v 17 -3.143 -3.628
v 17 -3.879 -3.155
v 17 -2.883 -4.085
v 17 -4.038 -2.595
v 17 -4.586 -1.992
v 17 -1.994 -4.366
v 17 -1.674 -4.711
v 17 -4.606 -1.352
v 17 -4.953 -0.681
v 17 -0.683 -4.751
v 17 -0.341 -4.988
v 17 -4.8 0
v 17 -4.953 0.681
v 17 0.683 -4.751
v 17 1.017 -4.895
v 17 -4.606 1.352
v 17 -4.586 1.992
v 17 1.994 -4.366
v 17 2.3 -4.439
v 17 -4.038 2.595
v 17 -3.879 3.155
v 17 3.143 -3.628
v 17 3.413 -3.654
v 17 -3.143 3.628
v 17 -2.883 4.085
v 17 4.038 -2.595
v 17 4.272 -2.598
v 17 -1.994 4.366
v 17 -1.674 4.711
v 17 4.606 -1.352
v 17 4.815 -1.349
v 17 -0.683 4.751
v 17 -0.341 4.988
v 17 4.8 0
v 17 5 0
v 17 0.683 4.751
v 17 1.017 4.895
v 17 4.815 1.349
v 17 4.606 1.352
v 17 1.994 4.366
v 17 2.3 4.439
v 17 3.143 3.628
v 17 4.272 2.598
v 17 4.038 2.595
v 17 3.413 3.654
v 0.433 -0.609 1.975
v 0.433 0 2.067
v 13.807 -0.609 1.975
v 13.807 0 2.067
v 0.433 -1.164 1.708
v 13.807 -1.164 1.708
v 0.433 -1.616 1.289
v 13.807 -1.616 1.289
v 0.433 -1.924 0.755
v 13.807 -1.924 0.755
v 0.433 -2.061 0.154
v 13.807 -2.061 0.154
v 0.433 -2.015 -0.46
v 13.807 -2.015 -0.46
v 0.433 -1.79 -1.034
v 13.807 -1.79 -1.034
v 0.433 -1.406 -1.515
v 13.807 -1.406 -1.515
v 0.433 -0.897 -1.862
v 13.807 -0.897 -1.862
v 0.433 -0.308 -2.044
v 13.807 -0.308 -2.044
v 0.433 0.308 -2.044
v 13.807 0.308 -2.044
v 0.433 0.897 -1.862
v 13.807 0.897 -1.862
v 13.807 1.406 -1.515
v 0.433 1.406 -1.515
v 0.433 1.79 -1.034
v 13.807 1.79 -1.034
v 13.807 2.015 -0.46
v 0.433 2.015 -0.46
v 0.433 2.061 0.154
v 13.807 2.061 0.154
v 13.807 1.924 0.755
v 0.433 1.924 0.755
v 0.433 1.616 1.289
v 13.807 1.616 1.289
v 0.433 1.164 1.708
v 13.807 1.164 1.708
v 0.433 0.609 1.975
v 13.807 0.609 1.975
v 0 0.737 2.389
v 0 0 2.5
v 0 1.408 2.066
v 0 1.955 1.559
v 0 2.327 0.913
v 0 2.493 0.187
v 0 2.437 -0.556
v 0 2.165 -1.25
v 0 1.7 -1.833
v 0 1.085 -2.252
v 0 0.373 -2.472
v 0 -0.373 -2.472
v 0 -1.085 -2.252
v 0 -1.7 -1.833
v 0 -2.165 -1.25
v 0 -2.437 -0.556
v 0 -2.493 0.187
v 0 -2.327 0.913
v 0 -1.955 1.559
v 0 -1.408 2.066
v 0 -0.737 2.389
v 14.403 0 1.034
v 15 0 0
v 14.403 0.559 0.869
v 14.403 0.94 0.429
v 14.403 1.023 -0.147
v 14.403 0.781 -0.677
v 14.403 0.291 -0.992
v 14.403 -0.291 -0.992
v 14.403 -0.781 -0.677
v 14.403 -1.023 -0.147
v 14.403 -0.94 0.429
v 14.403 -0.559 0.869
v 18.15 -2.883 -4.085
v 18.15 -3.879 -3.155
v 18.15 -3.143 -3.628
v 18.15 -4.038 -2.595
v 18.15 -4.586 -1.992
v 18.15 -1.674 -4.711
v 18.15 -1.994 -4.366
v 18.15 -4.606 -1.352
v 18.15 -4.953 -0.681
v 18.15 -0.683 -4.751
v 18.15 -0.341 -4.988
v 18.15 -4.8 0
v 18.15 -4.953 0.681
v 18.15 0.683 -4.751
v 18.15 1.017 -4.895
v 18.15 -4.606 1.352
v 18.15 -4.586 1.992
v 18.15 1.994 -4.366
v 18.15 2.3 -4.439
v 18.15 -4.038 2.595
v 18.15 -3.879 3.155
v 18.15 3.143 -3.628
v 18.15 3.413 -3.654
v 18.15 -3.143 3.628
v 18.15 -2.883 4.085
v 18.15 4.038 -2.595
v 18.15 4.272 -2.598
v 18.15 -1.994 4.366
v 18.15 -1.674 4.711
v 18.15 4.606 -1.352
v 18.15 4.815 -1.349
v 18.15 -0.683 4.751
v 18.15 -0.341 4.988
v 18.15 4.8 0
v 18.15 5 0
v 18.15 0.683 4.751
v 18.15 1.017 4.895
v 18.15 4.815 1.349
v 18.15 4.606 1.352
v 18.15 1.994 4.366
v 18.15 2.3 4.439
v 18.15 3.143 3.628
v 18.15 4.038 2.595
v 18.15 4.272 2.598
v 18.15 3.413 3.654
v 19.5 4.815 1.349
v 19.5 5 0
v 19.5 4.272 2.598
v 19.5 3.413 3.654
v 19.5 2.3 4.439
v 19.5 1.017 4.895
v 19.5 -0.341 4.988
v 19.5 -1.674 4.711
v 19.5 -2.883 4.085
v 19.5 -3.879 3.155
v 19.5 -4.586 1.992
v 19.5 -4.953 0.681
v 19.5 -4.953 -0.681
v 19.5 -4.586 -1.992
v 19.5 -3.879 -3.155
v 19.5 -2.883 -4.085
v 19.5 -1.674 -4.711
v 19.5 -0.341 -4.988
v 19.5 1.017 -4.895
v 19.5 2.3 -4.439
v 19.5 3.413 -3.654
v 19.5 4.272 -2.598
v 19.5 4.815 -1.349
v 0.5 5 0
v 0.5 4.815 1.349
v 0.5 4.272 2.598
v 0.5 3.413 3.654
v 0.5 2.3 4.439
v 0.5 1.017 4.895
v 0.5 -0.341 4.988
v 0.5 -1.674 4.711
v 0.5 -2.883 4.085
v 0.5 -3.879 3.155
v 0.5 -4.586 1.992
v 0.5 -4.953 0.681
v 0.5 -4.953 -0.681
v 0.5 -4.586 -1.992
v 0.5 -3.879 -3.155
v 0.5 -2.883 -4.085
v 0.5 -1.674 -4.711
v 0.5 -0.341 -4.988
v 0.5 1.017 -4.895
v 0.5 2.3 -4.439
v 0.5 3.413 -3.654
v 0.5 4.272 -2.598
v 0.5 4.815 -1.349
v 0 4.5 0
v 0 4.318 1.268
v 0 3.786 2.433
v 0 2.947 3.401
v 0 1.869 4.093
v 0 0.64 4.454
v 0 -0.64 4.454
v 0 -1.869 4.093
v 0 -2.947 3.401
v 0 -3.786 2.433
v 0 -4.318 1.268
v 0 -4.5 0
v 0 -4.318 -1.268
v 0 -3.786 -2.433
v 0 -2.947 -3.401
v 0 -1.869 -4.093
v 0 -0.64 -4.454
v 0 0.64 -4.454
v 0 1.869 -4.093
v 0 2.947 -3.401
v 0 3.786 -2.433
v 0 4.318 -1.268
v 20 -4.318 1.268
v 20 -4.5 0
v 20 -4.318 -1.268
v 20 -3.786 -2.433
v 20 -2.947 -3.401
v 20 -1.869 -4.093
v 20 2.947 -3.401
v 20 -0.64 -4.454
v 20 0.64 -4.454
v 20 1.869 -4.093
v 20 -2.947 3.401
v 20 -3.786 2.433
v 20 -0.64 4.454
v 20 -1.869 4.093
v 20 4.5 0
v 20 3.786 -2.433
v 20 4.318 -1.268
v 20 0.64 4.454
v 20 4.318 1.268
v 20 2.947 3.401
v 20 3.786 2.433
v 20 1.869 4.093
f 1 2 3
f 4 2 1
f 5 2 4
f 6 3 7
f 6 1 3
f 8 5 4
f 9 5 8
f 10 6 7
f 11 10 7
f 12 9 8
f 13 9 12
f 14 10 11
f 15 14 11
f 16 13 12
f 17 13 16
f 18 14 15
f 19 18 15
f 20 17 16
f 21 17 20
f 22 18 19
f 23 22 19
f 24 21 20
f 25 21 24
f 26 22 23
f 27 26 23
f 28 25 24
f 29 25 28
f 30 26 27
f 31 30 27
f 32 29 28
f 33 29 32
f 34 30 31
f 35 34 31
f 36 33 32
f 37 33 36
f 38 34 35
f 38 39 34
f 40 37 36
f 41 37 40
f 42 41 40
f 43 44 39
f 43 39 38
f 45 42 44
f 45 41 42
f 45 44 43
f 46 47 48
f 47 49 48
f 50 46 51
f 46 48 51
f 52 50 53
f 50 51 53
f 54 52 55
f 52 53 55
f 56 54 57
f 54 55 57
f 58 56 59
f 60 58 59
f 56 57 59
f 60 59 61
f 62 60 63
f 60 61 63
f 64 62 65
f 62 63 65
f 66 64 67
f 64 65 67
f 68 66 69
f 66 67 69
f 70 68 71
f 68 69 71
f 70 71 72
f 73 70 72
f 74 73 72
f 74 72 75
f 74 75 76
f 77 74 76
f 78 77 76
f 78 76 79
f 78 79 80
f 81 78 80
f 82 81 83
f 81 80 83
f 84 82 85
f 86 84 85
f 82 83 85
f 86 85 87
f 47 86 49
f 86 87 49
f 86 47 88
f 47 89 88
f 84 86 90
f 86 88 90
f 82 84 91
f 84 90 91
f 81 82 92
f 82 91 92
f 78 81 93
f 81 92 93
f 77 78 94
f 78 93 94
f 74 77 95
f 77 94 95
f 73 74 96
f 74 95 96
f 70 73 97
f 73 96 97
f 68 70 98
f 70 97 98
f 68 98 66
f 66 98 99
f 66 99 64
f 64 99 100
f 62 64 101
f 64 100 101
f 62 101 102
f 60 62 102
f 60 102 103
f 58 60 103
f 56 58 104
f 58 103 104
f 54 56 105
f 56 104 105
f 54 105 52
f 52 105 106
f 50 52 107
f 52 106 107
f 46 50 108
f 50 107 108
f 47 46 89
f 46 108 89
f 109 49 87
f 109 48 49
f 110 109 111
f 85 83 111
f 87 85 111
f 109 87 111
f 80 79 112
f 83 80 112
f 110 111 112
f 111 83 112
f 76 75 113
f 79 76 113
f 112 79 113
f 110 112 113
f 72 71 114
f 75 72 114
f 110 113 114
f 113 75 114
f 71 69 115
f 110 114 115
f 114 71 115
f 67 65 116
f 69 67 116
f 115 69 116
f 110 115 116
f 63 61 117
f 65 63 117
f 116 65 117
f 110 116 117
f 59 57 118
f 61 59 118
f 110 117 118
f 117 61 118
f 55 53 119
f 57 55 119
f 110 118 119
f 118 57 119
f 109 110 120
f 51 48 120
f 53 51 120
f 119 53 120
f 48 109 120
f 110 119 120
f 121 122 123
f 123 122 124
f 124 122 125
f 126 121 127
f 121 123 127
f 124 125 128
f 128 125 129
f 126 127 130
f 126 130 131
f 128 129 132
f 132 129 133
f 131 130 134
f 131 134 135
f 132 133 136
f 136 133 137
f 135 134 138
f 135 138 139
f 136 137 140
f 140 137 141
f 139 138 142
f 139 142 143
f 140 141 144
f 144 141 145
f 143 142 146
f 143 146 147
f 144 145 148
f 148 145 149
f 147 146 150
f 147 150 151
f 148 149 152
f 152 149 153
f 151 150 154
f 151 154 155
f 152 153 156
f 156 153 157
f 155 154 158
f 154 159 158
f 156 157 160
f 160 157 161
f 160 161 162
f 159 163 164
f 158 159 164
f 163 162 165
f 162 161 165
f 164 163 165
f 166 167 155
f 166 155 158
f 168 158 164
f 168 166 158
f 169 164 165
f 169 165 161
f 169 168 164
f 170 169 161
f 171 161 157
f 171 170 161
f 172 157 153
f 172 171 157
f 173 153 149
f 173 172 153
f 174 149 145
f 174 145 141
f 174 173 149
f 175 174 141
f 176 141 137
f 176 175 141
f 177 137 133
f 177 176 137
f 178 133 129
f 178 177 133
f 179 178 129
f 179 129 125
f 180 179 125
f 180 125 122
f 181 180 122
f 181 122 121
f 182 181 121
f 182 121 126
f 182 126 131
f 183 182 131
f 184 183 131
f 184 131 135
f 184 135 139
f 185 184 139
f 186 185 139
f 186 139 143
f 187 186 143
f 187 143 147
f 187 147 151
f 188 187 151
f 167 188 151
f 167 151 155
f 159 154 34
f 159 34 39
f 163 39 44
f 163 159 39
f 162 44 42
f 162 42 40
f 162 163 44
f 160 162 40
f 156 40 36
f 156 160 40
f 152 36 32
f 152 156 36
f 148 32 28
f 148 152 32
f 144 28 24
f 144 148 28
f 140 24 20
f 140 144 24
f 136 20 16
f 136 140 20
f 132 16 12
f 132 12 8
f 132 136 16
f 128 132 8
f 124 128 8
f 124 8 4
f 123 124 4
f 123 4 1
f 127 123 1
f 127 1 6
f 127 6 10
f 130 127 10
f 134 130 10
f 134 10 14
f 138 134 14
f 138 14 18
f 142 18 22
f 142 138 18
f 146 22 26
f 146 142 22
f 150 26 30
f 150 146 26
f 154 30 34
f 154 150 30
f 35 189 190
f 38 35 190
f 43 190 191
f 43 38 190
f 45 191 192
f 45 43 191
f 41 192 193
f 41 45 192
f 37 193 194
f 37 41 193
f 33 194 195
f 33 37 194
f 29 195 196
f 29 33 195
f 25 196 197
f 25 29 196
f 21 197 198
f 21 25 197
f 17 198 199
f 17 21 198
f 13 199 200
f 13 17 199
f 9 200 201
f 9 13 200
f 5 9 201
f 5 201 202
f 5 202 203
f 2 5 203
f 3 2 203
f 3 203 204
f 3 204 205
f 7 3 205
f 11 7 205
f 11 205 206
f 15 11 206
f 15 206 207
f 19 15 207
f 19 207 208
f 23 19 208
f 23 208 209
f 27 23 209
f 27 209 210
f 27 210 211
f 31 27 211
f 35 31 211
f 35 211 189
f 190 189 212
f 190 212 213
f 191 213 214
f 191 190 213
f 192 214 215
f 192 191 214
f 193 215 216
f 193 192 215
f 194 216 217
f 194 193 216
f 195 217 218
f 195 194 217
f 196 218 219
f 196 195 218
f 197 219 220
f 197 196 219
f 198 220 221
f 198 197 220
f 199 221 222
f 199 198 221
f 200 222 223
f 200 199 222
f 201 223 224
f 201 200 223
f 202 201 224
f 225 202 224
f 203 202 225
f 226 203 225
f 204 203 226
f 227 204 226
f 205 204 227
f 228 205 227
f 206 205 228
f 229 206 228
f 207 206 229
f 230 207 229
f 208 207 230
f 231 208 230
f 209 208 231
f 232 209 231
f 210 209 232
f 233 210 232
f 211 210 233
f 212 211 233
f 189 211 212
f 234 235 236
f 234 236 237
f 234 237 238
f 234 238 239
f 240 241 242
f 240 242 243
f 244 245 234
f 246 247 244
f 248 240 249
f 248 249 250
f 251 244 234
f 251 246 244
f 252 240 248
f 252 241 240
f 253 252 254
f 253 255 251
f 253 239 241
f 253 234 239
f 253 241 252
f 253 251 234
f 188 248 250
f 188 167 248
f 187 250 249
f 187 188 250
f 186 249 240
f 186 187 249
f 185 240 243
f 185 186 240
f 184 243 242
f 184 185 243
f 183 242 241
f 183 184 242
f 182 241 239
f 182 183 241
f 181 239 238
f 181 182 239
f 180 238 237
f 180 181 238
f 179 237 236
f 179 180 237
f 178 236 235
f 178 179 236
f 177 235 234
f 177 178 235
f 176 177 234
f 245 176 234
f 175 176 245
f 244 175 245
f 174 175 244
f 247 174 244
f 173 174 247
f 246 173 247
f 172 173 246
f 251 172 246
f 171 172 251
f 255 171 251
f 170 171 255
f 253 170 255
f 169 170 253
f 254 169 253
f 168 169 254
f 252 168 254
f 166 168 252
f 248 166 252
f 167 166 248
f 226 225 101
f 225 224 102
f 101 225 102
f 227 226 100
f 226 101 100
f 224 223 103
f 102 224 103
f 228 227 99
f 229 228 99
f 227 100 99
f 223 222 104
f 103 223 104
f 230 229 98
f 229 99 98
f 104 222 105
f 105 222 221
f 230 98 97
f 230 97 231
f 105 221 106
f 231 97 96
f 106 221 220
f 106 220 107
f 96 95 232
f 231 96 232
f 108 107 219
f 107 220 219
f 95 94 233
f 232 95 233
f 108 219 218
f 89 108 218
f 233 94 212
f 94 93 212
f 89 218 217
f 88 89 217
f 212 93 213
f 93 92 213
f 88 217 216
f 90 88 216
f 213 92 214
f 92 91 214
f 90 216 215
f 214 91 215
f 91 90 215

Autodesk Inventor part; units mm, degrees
sketch "Sketch_1" plane through (0, 0, 0) normal (0, 0, 1) x (1, 0, 0)
  line L0 (20, 0) -> (0, 0)
  line L1 (0, 0) -> (0, 4.5)
  line L2 (0, 4.5) -> (0.5, 5)
  line L3 (0.5, 5) -> (19.5, 5)
  line L4 (19.5, 5) -> (20, 4.5)
  line L5 (20, 4.5) -> (20, 0)
  line L6 (20, 0) -> (0, 0)
revolve "Revolution1" add sketch "Sketch_1" angle 360 about axis through (20, 0, 0) along (1, 0, 0)
sketch "Sketch2" plane through (0, 0, 0) normal (-1, 0, 0) x (0, 0, 1)
  point P0 (0, 0)
hole "Hole1" at (0, 0, 0) direction (1, 0, 0) diameter 4.134 depth 13.8066 tip angle 120 countersink diameter 5 countersink angle 90 thread size "M5x0.8" class "6H" standard "ISO Metric profile"
sketch "Sketch_20" plane through (0, 0, 0) normal (0, 0, 1) x (1, 0, 0)
  line L0 (20, 0) -> (-20, 0)
  line L1 (17, 9.6) -> (17, 4.8)
  line L2 (17, 4.8) -> (18.15, 4.8)
  line L3 (18.15, 4.8) -> (18.15, 9.6)
  line L4 (18.15, 9.6) -> (17, 9.6)
revolve "Revolution2" cut sketch "Sketch_20" angle 360 about axis through (20, 0, 0) along (1, 0, 0)
ref_plane "to_ring_F_R_XY" through (17.575, 0, 0) normal (1, 0, 0) x (0, 0, -1)
ref_plane "to_ring_F_R_YZ" through (17.575, 0, 0) normal (0, 0, -1) x (0, 1, 0)
ref_plane "to_ring_F_R_ZX" through (17.575, 0, 0) normal (0, 1, 0) x (1, 0, 0)
properties part number "SSFRBF-D10-L20-M5-U3"
